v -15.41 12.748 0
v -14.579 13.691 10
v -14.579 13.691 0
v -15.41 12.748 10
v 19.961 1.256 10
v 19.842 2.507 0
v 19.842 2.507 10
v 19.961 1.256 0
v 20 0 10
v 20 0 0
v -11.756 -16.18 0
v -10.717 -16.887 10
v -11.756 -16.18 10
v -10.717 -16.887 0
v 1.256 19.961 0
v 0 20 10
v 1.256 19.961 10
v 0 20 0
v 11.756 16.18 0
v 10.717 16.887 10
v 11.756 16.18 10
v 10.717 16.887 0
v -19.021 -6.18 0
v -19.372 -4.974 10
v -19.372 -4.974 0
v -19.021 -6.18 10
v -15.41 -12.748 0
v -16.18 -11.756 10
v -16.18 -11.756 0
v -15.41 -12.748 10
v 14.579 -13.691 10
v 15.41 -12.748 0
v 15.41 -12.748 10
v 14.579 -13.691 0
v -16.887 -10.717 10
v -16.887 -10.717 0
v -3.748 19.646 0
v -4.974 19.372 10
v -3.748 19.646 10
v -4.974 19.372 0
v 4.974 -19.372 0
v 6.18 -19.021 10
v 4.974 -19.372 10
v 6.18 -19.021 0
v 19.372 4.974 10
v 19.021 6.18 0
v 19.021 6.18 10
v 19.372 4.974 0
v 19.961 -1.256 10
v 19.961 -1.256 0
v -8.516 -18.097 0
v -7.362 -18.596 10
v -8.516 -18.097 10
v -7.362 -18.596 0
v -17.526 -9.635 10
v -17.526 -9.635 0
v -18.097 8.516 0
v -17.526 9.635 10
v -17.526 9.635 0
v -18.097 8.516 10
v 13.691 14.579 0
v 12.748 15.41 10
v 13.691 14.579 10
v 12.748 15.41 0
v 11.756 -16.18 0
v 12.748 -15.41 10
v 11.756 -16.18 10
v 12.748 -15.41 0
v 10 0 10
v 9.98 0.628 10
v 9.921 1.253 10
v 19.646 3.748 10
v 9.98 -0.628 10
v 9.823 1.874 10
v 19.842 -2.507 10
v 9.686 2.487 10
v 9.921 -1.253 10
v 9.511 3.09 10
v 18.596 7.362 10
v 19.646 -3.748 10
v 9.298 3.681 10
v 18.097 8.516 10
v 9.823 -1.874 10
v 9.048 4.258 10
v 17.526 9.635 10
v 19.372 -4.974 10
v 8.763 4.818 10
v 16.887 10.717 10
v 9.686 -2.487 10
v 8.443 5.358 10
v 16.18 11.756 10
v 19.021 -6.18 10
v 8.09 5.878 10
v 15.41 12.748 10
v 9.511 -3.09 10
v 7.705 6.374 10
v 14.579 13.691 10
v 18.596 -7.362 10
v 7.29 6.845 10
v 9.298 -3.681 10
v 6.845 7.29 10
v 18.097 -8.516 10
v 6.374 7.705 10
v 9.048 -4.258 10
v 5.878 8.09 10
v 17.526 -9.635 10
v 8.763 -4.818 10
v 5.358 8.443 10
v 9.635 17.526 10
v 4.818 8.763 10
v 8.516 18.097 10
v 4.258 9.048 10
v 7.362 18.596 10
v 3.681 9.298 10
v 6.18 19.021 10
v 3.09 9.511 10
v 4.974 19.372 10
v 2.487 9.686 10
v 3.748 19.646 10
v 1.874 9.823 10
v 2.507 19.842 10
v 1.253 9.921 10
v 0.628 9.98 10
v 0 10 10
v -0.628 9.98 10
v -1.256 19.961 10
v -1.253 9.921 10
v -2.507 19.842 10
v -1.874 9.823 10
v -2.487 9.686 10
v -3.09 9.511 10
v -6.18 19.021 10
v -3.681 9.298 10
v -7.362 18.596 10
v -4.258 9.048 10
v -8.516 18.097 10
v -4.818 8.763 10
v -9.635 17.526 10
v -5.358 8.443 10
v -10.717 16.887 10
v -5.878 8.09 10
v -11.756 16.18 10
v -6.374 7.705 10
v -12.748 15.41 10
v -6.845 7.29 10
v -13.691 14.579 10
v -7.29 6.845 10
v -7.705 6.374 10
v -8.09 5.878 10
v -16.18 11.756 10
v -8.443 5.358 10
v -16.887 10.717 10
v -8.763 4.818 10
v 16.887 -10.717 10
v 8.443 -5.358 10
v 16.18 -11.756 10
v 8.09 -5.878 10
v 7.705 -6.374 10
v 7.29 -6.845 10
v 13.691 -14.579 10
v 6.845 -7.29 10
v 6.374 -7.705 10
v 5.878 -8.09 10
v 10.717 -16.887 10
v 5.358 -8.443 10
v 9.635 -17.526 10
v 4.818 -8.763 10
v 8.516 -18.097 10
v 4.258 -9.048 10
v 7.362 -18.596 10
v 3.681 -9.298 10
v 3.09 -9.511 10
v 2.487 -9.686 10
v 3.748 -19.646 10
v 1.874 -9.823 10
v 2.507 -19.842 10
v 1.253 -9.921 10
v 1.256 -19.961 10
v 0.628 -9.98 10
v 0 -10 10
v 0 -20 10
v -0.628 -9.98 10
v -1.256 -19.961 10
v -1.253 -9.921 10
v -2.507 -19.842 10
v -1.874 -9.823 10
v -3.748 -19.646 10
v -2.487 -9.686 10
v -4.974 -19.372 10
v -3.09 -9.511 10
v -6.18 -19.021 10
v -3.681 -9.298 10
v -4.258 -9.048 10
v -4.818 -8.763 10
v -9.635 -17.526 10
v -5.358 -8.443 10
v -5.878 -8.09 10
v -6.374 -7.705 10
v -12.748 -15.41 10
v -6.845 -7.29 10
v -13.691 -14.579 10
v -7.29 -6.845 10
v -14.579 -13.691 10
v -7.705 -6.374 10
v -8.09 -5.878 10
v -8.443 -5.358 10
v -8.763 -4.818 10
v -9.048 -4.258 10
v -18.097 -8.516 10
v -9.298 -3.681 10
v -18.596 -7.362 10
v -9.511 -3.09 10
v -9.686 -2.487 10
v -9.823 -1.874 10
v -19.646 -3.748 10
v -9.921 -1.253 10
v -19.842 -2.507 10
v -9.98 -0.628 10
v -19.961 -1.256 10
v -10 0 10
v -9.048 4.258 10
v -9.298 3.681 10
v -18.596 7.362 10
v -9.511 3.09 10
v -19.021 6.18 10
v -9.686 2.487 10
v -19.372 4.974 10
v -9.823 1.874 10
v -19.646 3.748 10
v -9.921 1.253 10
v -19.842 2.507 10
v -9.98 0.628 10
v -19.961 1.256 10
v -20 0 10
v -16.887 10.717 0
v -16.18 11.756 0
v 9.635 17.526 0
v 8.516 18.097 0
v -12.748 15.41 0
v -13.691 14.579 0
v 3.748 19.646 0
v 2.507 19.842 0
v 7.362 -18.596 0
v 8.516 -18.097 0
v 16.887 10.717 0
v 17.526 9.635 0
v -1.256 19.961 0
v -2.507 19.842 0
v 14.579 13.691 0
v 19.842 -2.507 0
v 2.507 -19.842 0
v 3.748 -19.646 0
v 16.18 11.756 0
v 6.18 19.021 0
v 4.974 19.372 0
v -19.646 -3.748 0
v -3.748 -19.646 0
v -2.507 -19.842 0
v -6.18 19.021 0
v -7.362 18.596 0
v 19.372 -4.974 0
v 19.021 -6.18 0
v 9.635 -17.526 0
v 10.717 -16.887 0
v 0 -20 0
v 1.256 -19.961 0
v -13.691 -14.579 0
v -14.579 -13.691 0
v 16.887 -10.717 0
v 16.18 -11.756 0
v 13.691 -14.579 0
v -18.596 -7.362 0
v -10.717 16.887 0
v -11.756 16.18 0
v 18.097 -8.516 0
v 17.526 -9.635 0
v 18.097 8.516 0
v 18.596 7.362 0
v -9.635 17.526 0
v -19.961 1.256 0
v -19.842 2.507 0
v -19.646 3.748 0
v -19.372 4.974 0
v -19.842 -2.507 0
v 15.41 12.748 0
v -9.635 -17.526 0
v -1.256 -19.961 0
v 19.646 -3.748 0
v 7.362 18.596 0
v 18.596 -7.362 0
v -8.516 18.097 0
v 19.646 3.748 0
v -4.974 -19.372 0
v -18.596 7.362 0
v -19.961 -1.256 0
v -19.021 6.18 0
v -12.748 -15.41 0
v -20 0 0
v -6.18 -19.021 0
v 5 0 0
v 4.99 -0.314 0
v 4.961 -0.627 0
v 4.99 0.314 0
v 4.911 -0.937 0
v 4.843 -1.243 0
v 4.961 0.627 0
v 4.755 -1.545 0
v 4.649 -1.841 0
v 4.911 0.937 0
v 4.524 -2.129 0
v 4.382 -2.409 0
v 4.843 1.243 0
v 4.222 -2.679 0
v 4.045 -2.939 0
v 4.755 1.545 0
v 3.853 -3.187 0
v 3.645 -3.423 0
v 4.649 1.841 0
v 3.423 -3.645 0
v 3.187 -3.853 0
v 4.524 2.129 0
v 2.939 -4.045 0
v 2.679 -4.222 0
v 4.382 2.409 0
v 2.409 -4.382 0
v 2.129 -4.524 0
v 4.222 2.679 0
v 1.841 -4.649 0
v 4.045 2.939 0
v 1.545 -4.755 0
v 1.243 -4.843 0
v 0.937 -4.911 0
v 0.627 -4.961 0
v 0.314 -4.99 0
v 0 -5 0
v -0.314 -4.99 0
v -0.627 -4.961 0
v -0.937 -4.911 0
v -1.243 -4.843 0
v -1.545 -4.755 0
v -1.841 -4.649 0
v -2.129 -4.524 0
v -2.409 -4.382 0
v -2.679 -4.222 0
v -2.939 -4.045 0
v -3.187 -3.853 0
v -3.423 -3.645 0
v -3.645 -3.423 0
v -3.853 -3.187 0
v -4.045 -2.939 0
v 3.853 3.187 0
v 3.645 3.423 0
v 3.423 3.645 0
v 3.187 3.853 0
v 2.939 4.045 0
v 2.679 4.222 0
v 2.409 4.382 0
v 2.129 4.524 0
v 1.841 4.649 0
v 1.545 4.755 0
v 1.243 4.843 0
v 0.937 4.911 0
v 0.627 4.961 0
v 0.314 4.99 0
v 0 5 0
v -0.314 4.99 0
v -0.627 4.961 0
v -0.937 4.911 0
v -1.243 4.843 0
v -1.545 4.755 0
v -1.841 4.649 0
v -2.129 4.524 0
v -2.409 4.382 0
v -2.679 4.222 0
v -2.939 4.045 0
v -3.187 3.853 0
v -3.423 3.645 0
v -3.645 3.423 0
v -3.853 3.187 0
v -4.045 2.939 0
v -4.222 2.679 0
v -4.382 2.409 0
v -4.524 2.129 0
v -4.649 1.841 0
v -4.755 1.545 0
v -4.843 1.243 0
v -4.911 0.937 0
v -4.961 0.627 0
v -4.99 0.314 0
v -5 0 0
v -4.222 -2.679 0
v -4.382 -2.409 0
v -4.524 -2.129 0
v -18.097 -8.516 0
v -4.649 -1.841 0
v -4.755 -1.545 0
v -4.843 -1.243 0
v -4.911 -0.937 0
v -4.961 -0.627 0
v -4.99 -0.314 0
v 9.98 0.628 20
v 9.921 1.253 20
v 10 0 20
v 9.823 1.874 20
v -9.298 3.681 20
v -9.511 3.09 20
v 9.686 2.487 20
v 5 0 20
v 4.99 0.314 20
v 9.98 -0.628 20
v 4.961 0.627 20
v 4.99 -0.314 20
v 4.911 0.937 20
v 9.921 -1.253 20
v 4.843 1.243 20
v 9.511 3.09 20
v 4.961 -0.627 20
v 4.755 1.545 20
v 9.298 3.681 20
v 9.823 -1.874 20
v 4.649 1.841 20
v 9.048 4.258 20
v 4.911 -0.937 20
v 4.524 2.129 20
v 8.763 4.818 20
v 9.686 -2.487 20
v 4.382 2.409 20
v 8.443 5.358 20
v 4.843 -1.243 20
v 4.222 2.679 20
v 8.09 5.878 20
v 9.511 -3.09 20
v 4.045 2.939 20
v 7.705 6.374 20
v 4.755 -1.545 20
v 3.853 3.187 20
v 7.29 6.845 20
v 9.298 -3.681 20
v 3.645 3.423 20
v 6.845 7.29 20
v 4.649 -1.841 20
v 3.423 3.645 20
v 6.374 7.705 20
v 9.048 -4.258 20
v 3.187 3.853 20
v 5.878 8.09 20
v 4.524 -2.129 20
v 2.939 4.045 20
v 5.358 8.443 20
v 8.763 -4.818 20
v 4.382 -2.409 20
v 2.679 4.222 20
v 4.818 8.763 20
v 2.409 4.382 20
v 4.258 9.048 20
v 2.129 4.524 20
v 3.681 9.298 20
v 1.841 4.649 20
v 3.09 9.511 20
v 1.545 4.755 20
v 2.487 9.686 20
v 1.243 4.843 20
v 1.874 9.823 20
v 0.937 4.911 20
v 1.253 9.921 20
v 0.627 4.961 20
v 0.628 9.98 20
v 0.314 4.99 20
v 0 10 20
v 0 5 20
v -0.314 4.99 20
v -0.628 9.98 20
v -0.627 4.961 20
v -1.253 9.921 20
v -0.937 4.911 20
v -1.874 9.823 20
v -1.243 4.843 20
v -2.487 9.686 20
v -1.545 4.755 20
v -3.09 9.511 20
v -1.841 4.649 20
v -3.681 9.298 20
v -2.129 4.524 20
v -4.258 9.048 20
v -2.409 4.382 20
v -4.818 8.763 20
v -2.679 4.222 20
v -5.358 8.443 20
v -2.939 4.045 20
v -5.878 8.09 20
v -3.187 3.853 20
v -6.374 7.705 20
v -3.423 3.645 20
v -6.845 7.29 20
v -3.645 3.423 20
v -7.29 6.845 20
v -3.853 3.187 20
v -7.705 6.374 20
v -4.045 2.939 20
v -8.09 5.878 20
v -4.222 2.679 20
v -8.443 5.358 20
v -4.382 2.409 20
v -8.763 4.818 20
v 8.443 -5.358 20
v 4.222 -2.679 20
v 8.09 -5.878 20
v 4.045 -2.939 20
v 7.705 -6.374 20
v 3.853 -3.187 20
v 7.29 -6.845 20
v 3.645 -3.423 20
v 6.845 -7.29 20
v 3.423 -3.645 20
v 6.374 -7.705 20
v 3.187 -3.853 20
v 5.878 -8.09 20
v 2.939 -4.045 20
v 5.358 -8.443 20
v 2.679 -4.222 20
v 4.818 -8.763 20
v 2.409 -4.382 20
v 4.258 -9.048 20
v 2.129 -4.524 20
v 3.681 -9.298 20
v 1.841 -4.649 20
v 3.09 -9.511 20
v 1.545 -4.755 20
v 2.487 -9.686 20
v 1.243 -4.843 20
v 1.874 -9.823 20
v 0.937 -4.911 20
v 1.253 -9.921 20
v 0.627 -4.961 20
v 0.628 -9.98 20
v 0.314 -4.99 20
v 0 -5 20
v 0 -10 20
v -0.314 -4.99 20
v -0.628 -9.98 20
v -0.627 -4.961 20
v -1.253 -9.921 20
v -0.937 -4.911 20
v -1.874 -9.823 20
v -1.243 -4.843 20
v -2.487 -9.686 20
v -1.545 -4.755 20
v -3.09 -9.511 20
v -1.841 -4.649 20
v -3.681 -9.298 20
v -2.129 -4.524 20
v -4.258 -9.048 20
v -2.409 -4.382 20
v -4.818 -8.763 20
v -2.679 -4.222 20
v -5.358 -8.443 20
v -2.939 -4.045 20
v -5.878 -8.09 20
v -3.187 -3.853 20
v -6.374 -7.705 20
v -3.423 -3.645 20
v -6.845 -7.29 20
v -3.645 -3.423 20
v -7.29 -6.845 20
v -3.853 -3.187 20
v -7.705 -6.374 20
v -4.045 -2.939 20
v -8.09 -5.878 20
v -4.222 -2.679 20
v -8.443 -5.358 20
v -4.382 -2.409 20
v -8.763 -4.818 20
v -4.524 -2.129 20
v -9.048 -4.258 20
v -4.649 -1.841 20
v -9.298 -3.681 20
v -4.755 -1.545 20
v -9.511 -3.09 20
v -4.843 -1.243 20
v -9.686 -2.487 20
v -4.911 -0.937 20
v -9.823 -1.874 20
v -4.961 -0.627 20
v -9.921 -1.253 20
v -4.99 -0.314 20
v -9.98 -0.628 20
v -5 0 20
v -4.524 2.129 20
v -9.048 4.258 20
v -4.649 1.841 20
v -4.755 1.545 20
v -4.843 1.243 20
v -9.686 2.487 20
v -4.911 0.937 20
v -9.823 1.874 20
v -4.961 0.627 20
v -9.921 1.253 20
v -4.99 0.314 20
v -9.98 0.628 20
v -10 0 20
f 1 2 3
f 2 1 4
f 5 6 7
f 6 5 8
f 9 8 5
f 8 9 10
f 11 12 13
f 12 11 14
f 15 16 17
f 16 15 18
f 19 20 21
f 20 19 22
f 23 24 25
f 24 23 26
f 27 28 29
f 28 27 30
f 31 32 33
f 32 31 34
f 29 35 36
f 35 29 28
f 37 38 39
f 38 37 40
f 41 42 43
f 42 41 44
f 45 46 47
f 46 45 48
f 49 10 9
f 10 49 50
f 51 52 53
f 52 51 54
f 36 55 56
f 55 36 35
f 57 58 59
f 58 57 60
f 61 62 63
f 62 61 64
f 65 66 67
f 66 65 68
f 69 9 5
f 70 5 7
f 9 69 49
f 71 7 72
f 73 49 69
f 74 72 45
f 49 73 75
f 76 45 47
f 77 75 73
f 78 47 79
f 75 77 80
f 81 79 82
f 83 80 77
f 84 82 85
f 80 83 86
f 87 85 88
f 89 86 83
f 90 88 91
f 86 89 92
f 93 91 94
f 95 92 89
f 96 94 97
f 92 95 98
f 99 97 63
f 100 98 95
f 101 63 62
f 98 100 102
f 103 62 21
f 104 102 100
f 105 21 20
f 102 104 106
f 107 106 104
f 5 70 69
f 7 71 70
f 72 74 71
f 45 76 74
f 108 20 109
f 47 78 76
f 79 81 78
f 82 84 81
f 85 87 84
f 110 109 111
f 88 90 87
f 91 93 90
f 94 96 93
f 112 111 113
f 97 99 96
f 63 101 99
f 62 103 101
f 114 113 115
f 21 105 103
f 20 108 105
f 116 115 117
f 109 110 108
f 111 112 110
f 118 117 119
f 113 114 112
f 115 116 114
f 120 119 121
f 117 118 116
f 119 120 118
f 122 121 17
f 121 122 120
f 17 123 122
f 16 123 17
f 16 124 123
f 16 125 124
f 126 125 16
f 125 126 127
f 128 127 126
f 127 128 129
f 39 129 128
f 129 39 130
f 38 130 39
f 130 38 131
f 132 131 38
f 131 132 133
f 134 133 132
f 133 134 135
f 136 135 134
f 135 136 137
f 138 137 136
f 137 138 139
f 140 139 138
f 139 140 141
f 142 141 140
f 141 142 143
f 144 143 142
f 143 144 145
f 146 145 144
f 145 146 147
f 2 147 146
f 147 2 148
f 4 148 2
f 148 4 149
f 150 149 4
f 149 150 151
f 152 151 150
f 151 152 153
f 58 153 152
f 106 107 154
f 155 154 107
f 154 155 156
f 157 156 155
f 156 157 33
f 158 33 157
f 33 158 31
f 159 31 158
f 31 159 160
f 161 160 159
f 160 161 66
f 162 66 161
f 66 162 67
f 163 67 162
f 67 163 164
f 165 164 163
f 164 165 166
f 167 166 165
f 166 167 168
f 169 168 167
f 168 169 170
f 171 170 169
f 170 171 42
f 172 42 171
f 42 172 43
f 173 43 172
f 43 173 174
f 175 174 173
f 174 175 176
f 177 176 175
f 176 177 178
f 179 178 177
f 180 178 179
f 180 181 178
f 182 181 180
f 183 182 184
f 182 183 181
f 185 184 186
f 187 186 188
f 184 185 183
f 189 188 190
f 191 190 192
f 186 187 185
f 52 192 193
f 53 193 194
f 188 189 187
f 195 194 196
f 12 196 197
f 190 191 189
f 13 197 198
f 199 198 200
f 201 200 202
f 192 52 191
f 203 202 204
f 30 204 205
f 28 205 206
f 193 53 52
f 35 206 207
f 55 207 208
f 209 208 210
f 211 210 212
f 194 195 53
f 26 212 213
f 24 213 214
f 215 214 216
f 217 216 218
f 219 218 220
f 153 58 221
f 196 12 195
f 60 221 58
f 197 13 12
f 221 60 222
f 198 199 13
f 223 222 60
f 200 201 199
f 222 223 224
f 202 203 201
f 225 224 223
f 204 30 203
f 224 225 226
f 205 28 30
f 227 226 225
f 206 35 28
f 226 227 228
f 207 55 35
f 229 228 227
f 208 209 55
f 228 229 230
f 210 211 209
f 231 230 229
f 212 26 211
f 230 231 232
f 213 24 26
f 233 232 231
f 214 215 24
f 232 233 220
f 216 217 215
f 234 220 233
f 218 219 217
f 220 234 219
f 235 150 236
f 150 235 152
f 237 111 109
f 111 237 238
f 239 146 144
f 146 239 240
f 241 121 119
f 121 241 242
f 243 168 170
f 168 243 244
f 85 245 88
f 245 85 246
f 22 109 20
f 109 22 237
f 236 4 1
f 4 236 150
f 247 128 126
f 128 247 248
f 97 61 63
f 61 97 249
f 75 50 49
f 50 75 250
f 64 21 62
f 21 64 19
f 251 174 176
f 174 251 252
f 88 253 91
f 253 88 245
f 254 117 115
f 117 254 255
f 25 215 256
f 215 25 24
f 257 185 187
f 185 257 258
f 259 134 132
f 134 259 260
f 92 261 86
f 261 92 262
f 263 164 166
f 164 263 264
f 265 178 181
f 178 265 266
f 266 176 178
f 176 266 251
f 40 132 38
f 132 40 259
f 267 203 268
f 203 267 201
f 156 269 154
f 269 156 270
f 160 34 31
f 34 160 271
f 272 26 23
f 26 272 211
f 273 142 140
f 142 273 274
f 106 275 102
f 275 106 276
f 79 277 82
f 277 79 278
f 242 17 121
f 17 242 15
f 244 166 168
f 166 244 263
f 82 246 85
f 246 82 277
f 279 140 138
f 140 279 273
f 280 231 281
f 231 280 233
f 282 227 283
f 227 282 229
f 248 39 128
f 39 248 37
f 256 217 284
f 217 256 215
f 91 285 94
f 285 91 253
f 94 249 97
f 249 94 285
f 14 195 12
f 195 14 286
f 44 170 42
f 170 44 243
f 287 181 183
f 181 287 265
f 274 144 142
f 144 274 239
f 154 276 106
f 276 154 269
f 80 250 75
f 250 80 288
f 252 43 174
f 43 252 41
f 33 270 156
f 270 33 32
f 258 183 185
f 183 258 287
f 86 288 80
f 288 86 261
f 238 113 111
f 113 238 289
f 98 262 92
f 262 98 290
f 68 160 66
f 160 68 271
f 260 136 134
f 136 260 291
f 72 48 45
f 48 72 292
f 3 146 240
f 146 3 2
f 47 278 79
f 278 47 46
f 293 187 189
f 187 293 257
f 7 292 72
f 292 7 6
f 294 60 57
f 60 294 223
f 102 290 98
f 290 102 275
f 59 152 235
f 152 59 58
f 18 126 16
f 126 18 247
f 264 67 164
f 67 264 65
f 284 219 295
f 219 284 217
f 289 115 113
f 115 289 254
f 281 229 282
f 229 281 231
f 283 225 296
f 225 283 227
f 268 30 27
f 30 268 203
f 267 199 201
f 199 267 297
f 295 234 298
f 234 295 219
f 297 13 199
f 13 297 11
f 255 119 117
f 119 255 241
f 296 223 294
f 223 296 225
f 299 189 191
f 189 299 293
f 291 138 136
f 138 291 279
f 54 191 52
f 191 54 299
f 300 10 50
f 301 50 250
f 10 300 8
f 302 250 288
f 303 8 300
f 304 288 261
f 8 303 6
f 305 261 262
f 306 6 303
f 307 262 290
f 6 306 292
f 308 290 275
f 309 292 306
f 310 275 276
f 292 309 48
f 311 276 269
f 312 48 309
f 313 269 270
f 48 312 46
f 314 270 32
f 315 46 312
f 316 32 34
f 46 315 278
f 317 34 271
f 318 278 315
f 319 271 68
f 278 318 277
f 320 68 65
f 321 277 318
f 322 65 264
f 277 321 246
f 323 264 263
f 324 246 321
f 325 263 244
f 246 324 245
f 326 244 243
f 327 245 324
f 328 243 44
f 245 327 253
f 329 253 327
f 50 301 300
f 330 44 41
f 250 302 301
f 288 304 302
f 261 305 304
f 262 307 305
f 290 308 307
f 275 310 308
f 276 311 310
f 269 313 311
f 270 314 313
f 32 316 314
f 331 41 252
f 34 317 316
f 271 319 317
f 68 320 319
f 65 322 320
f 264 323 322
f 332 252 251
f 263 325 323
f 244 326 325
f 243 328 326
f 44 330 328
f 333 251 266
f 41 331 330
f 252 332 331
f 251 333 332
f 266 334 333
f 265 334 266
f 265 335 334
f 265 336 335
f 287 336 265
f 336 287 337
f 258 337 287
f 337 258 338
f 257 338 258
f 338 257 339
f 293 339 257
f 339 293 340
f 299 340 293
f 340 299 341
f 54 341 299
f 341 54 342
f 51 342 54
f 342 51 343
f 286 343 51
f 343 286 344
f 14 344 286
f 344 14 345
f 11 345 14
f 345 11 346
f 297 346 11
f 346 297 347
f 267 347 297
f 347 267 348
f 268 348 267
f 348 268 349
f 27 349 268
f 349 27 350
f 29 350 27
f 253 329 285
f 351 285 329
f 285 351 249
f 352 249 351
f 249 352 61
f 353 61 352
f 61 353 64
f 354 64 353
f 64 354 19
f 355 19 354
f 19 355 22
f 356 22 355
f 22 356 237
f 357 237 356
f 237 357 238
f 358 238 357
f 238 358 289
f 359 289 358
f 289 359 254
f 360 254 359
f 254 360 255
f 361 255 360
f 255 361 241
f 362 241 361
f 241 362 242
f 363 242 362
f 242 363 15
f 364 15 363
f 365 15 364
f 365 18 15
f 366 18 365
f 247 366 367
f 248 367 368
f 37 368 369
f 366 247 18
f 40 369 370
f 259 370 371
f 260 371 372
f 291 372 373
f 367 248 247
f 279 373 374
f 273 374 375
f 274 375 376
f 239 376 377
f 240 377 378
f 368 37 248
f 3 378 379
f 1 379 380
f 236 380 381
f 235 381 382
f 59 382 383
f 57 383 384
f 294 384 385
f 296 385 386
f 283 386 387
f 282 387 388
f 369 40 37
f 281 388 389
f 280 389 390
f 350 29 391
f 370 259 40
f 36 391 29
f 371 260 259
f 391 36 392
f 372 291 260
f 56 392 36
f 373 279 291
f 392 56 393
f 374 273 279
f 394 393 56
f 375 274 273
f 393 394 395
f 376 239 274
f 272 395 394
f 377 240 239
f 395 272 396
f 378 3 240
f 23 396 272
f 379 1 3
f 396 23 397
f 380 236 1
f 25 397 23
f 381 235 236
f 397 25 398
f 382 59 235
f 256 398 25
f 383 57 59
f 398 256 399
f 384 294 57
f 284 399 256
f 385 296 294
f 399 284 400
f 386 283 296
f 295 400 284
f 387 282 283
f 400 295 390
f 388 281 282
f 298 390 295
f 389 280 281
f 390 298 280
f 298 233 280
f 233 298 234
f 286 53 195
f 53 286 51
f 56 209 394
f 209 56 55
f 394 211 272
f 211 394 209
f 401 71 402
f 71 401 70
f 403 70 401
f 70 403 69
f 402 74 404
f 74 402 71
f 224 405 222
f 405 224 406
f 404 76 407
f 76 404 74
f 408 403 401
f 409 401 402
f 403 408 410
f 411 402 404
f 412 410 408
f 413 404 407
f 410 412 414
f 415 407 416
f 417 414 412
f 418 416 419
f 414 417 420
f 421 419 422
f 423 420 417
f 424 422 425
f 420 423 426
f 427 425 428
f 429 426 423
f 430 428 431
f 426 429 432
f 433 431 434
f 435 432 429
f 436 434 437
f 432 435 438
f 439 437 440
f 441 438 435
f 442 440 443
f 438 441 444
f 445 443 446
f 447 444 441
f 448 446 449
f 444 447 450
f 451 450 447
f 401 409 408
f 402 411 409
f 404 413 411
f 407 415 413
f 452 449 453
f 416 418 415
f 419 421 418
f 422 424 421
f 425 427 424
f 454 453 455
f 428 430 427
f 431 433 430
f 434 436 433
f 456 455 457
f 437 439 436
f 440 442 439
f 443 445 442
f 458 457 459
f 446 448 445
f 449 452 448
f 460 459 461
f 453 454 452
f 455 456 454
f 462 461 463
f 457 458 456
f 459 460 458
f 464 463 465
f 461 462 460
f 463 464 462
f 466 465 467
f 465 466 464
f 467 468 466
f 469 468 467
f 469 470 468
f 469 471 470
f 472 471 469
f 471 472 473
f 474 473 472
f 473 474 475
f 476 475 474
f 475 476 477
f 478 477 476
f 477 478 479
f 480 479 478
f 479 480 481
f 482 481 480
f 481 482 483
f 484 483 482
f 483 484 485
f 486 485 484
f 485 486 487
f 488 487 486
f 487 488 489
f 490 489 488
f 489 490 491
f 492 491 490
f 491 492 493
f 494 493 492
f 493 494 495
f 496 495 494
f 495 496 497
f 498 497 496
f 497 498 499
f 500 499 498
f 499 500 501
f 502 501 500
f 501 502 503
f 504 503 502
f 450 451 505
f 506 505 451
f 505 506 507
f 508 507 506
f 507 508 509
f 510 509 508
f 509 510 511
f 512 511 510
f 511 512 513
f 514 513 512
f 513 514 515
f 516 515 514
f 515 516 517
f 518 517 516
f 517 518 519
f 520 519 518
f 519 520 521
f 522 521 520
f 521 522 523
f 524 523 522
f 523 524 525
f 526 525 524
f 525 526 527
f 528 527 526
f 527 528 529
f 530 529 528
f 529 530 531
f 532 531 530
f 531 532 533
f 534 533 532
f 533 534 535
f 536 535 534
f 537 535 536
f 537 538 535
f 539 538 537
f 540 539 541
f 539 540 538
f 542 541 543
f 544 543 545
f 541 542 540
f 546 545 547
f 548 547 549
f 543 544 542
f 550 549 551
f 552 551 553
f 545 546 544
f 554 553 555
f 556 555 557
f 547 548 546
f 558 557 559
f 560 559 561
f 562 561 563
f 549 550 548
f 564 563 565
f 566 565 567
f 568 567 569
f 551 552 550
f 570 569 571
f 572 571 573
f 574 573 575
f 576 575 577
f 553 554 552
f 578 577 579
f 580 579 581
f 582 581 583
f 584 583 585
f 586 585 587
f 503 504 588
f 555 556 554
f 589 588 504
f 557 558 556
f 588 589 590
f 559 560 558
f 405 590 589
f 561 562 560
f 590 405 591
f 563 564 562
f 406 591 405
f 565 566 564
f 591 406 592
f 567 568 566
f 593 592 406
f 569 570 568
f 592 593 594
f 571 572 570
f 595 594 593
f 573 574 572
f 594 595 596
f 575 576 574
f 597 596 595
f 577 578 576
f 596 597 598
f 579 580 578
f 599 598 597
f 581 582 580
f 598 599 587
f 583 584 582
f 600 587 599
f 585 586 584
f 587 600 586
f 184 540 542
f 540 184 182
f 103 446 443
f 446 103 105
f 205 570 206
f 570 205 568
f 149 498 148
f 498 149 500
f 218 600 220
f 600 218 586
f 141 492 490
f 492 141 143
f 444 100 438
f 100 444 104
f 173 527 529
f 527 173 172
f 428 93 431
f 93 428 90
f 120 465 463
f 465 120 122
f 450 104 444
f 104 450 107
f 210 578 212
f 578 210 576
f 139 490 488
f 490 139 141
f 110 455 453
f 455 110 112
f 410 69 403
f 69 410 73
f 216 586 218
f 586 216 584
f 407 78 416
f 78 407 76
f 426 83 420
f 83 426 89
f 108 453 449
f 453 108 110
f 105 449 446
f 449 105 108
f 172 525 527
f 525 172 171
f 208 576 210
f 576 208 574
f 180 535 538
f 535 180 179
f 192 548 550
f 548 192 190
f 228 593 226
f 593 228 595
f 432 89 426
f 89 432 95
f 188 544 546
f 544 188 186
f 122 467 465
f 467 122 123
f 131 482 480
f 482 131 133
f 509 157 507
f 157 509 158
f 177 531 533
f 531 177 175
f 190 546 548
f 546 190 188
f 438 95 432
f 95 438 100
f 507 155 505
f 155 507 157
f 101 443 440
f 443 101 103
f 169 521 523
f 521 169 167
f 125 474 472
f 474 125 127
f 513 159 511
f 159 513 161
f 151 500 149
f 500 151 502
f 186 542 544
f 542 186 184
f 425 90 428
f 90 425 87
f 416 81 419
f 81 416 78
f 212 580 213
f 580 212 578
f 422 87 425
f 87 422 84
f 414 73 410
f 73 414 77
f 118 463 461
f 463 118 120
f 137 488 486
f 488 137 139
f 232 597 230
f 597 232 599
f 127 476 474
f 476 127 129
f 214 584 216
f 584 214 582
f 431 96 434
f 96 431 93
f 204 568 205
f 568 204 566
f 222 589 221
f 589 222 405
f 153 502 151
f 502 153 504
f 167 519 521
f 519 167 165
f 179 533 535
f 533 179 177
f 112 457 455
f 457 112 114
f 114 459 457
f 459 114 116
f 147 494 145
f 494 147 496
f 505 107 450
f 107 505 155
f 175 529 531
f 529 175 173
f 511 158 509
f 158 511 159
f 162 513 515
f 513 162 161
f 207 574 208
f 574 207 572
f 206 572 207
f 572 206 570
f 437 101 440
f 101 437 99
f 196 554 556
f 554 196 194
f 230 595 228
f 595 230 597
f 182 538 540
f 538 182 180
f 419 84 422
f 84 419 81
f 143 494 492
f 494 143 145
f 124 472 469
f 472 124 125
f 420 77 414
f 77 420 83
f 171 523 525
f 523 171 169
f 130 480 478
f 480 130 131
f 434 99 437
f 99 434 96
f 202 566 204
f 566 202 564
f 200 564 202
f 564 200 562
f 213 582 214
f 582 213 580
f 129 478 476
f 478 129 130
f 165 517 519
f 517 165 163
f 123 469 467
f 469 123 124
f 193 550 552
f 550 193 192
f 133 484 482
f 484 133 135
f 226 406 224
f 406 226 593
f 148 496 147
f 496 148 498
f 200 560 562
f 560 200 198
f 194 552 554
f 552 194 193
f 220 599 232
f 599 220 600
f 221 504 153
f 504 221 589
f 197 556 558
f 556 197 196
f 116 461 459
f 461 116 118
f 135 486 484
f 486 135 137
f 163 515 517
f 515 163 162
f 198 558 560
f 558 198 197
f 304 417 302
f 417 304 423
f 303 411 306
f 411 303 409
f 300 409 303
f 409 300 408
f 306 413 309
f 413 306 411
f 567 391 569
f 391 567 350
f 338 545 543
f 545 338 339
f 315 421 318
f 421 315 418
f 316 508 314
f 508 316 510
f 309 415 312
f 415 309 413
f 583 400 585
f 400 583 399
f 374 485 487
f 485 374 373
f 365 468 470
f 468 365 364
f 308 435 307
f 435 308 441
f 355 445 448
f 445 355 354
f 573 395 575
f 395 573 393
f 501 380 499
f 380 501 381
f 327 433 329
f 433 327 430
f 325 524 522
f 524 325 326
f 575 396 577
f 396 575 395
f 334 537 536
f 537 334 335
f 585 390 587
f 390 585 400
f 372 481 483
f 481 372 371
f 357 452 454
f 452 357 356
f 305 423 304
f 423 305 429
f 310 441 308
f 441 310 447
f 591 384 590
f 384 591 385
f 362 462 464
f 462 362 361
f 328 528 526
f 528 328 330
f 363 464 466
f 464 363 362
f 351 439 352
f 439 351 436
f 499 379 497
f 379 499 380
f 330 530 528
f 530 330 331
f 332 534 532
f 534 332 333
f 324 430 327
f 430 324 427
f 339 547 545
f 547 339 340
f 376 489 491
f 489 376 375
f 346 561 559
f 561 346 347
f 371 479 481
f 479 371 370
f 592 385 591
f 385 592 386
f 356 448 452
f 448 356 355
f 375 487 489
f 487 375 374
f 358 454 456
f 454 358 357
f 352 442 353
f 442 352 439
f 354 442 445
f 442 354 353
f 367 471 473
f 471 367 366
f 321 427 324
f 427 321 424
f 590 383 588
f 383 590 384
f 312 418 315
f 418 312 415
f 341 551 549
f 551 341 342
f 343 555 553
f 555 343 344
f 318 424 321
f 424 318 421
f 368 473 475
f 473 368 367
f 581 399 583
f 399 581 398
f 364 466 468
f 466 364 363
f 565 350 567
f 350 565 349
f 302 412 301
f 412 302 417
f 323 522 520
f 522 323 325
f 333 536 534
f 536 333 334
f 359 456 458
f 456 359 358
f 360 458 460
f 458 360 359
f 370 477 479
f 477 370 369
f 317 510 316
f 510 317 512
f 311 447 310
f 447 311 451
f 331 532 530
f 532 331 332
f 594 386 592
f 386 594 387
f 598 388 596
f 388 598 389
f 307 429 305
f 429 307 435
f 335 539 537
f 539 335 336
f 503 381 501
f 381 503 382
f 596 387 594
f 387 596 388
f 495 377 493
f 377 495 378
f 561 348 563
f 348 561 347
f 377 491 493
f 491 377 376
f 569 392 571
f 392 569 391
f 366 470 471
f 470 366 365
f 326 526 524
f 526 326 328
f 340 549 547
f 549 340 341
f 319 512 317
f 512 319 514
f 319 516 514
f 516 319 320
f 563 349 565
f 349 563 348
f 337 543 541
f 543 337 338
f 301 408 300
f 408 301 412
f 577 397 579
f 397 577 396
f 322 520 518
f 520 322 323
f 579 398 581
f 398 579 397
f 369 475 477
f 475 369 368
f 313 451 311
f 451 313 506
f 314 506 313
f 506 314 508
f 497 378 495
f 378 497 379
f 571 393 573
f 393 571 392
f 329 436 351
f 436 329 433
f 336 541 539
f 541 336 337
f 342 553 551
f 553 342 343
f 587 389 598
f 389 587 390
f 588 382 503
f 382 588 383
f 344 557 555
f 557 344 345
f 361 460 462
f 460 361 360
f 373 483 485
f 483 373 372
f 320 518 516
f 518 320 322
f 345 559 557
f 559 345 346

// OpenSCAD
difference()
{

union()
{
cylinder(r=20, h=10, $fn=100);
translate([0,0,10])
cylinder(r=10, h=10, $fn=100);

}


translate([0,0,-20])
cylinder(r=5, h=50, $fn=100);
}
